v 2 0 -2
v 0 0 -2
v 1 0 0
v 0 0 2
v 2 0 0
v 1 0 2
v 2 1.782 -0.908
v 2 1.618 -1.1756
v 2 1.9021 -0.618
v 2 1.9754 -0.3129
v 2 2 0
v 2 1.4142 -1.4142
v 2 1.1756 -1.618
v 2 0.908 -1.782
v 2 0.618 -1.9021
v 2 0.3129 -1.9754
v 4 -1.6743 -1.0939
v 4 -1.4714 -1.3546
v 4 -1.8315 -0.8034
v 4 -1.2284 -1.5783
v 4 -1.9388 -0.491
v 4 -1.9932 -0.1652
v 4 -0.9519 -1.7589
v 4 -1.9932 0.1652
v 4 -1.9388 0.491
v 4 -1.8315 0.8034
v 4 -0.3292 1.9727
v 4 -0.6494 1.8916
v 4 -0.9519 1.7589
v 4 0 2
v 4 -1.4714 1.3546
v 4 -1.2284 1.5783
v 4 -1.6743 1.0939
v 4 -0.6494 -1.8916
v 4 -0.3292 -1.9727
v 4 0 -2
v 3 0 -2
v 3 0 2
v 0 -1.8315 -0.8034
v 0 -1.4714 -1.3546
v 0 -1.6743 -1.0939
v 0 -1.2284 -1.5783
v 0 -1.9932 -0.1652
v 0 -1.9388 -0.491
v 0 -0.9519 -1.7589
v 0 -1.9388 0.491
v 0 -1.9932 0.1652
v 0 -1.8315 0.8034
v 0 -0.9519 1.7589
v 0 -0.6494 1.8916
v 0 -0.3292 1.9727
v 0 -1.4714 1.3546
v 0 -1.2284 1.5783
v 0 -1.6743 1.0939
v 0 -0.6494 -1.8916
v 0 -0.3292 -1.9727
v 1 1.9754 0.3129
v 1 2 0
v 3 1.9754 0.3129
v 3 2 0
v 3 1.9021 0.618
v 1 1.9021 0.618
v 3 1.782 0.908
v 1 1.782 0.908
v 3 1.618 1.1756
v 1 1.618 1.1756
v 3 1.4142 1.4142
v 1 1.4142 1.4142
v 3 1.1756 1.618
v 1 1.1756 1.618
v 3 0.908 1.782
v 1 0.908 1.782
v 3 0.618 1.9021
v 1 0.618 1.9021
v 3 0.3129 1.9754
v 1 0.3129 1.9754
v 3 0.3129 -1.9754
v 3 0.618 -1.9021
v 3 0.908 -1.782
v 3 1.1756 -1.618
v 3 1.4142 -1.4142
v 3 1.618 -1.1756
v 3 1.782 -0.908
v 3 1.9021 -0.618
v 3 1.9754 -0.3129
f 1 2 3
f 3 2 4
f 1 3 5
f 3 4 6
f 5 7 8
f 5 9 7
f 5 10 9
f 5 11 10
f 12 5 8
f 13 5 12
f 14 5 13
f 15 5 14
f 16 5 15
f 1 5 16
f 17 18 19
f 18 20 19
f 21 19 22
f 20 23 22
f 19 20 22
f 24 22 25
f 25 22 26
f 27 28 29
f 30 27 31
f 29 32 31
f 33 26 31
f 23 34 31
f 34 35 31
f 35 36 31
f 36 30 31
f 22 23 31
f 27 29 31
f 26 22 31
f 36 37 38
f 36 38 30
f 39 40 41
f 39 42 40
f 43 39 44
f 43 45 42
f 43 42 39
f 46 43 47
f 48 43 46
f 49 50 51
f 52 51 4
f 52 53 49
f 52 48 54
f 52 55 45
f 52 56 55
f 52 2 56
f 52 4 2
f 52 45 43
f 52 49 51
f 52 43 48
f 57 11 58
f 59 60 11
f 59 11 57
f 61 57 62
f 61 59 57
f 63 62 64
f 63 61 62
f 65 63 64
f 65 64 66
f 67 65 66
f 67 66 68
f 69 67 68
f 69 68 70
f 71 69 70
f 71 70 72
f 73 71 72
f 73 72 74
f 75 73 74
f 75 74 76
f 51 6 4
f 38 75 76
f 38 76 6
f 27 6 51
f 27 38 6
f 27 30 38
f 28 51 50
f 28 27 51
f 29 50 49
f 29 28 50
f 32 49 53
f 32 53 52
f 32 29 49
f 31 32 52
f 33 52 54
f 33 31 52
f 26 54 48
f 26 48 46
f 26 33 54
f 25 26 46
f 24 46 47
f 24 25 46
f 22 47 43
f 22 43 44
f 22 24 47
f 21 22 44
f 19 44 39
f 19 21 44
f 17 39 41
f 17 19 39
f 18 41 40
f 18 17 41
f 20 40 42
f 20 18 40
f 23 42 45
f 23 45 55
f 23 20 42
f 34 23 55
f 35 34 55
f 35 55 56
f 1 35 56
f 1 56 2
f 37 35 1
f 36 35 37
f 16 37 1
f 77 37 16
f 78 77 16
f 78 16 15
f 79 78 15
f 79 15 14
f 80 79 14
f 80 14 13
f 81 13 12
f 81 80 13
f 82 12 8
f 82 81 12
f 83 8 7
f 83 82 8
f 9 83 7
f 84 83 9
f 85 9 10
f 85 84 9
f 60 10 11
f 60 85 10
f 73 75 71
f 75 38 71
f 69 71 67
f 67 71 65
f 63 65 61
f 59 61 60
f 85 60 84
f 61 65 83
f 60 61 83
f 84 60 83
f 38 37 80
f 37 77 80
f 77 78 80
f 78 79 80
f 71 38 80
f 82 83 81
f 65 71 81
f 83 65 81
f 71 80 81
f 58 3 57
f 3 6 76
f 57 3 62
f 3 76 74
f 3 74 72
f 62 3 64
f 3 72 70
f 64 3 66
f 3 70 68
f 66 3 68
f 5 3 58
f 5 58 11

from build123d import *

# Parameters (mm, degrees)
SKETCH5_W          = 4
SKETCH5_H          = 2
SKETCH6_W          = 1
SKETCH6_H          = 2
CUT_EXTRUDE5_DEPTH = 5.5
SKETCH7_W          = 1
SKETCH7_H          = 2
CUT_EXTRUDE6_DEPTH = 3


with BuildPart() as part:
    # Sketch5 → Revolve-Thin2 (revolve)
    with BuildSketch(Plane.XY):
        with Locations((2, 1)):
            Rectangle(SKETCH5_W, SKETCH5_H)
    revolve(axis=Axis((0, 0, 0), (1, 0, 0)))

    # Sketch6 → Cut-Extrude5 (cut, symmetric)
    with BuildSketch(Plane.XY):
        with Locations((3.5, 1)):
            Rectangle(SKETCH6_W, SKETCH6_H)
        with Locations((0.5, 1)):
            Rectangle(SKETCH6_W, SKETCH6_H)
    extrude(amount=CUT_EXTRUDE5_DEPTH, both=True, mode=Mode.SUBTRACT)

    # Sketch7 → Cut-Extrude6 (cut)
    with BuildSketch(Plane(origin=(0, 0, 0), x_dir=(1, 0, 0), z_dir=(0, 1, 0))):
        with Locations((1.5, 1)):
            Rectangle(SKETCH7_W, SKETCH7_H)
    extrude(amount=CUT_EXTRUDE6_DEPTH, mode=Mode.SUBTRACT)


solid = part.part
